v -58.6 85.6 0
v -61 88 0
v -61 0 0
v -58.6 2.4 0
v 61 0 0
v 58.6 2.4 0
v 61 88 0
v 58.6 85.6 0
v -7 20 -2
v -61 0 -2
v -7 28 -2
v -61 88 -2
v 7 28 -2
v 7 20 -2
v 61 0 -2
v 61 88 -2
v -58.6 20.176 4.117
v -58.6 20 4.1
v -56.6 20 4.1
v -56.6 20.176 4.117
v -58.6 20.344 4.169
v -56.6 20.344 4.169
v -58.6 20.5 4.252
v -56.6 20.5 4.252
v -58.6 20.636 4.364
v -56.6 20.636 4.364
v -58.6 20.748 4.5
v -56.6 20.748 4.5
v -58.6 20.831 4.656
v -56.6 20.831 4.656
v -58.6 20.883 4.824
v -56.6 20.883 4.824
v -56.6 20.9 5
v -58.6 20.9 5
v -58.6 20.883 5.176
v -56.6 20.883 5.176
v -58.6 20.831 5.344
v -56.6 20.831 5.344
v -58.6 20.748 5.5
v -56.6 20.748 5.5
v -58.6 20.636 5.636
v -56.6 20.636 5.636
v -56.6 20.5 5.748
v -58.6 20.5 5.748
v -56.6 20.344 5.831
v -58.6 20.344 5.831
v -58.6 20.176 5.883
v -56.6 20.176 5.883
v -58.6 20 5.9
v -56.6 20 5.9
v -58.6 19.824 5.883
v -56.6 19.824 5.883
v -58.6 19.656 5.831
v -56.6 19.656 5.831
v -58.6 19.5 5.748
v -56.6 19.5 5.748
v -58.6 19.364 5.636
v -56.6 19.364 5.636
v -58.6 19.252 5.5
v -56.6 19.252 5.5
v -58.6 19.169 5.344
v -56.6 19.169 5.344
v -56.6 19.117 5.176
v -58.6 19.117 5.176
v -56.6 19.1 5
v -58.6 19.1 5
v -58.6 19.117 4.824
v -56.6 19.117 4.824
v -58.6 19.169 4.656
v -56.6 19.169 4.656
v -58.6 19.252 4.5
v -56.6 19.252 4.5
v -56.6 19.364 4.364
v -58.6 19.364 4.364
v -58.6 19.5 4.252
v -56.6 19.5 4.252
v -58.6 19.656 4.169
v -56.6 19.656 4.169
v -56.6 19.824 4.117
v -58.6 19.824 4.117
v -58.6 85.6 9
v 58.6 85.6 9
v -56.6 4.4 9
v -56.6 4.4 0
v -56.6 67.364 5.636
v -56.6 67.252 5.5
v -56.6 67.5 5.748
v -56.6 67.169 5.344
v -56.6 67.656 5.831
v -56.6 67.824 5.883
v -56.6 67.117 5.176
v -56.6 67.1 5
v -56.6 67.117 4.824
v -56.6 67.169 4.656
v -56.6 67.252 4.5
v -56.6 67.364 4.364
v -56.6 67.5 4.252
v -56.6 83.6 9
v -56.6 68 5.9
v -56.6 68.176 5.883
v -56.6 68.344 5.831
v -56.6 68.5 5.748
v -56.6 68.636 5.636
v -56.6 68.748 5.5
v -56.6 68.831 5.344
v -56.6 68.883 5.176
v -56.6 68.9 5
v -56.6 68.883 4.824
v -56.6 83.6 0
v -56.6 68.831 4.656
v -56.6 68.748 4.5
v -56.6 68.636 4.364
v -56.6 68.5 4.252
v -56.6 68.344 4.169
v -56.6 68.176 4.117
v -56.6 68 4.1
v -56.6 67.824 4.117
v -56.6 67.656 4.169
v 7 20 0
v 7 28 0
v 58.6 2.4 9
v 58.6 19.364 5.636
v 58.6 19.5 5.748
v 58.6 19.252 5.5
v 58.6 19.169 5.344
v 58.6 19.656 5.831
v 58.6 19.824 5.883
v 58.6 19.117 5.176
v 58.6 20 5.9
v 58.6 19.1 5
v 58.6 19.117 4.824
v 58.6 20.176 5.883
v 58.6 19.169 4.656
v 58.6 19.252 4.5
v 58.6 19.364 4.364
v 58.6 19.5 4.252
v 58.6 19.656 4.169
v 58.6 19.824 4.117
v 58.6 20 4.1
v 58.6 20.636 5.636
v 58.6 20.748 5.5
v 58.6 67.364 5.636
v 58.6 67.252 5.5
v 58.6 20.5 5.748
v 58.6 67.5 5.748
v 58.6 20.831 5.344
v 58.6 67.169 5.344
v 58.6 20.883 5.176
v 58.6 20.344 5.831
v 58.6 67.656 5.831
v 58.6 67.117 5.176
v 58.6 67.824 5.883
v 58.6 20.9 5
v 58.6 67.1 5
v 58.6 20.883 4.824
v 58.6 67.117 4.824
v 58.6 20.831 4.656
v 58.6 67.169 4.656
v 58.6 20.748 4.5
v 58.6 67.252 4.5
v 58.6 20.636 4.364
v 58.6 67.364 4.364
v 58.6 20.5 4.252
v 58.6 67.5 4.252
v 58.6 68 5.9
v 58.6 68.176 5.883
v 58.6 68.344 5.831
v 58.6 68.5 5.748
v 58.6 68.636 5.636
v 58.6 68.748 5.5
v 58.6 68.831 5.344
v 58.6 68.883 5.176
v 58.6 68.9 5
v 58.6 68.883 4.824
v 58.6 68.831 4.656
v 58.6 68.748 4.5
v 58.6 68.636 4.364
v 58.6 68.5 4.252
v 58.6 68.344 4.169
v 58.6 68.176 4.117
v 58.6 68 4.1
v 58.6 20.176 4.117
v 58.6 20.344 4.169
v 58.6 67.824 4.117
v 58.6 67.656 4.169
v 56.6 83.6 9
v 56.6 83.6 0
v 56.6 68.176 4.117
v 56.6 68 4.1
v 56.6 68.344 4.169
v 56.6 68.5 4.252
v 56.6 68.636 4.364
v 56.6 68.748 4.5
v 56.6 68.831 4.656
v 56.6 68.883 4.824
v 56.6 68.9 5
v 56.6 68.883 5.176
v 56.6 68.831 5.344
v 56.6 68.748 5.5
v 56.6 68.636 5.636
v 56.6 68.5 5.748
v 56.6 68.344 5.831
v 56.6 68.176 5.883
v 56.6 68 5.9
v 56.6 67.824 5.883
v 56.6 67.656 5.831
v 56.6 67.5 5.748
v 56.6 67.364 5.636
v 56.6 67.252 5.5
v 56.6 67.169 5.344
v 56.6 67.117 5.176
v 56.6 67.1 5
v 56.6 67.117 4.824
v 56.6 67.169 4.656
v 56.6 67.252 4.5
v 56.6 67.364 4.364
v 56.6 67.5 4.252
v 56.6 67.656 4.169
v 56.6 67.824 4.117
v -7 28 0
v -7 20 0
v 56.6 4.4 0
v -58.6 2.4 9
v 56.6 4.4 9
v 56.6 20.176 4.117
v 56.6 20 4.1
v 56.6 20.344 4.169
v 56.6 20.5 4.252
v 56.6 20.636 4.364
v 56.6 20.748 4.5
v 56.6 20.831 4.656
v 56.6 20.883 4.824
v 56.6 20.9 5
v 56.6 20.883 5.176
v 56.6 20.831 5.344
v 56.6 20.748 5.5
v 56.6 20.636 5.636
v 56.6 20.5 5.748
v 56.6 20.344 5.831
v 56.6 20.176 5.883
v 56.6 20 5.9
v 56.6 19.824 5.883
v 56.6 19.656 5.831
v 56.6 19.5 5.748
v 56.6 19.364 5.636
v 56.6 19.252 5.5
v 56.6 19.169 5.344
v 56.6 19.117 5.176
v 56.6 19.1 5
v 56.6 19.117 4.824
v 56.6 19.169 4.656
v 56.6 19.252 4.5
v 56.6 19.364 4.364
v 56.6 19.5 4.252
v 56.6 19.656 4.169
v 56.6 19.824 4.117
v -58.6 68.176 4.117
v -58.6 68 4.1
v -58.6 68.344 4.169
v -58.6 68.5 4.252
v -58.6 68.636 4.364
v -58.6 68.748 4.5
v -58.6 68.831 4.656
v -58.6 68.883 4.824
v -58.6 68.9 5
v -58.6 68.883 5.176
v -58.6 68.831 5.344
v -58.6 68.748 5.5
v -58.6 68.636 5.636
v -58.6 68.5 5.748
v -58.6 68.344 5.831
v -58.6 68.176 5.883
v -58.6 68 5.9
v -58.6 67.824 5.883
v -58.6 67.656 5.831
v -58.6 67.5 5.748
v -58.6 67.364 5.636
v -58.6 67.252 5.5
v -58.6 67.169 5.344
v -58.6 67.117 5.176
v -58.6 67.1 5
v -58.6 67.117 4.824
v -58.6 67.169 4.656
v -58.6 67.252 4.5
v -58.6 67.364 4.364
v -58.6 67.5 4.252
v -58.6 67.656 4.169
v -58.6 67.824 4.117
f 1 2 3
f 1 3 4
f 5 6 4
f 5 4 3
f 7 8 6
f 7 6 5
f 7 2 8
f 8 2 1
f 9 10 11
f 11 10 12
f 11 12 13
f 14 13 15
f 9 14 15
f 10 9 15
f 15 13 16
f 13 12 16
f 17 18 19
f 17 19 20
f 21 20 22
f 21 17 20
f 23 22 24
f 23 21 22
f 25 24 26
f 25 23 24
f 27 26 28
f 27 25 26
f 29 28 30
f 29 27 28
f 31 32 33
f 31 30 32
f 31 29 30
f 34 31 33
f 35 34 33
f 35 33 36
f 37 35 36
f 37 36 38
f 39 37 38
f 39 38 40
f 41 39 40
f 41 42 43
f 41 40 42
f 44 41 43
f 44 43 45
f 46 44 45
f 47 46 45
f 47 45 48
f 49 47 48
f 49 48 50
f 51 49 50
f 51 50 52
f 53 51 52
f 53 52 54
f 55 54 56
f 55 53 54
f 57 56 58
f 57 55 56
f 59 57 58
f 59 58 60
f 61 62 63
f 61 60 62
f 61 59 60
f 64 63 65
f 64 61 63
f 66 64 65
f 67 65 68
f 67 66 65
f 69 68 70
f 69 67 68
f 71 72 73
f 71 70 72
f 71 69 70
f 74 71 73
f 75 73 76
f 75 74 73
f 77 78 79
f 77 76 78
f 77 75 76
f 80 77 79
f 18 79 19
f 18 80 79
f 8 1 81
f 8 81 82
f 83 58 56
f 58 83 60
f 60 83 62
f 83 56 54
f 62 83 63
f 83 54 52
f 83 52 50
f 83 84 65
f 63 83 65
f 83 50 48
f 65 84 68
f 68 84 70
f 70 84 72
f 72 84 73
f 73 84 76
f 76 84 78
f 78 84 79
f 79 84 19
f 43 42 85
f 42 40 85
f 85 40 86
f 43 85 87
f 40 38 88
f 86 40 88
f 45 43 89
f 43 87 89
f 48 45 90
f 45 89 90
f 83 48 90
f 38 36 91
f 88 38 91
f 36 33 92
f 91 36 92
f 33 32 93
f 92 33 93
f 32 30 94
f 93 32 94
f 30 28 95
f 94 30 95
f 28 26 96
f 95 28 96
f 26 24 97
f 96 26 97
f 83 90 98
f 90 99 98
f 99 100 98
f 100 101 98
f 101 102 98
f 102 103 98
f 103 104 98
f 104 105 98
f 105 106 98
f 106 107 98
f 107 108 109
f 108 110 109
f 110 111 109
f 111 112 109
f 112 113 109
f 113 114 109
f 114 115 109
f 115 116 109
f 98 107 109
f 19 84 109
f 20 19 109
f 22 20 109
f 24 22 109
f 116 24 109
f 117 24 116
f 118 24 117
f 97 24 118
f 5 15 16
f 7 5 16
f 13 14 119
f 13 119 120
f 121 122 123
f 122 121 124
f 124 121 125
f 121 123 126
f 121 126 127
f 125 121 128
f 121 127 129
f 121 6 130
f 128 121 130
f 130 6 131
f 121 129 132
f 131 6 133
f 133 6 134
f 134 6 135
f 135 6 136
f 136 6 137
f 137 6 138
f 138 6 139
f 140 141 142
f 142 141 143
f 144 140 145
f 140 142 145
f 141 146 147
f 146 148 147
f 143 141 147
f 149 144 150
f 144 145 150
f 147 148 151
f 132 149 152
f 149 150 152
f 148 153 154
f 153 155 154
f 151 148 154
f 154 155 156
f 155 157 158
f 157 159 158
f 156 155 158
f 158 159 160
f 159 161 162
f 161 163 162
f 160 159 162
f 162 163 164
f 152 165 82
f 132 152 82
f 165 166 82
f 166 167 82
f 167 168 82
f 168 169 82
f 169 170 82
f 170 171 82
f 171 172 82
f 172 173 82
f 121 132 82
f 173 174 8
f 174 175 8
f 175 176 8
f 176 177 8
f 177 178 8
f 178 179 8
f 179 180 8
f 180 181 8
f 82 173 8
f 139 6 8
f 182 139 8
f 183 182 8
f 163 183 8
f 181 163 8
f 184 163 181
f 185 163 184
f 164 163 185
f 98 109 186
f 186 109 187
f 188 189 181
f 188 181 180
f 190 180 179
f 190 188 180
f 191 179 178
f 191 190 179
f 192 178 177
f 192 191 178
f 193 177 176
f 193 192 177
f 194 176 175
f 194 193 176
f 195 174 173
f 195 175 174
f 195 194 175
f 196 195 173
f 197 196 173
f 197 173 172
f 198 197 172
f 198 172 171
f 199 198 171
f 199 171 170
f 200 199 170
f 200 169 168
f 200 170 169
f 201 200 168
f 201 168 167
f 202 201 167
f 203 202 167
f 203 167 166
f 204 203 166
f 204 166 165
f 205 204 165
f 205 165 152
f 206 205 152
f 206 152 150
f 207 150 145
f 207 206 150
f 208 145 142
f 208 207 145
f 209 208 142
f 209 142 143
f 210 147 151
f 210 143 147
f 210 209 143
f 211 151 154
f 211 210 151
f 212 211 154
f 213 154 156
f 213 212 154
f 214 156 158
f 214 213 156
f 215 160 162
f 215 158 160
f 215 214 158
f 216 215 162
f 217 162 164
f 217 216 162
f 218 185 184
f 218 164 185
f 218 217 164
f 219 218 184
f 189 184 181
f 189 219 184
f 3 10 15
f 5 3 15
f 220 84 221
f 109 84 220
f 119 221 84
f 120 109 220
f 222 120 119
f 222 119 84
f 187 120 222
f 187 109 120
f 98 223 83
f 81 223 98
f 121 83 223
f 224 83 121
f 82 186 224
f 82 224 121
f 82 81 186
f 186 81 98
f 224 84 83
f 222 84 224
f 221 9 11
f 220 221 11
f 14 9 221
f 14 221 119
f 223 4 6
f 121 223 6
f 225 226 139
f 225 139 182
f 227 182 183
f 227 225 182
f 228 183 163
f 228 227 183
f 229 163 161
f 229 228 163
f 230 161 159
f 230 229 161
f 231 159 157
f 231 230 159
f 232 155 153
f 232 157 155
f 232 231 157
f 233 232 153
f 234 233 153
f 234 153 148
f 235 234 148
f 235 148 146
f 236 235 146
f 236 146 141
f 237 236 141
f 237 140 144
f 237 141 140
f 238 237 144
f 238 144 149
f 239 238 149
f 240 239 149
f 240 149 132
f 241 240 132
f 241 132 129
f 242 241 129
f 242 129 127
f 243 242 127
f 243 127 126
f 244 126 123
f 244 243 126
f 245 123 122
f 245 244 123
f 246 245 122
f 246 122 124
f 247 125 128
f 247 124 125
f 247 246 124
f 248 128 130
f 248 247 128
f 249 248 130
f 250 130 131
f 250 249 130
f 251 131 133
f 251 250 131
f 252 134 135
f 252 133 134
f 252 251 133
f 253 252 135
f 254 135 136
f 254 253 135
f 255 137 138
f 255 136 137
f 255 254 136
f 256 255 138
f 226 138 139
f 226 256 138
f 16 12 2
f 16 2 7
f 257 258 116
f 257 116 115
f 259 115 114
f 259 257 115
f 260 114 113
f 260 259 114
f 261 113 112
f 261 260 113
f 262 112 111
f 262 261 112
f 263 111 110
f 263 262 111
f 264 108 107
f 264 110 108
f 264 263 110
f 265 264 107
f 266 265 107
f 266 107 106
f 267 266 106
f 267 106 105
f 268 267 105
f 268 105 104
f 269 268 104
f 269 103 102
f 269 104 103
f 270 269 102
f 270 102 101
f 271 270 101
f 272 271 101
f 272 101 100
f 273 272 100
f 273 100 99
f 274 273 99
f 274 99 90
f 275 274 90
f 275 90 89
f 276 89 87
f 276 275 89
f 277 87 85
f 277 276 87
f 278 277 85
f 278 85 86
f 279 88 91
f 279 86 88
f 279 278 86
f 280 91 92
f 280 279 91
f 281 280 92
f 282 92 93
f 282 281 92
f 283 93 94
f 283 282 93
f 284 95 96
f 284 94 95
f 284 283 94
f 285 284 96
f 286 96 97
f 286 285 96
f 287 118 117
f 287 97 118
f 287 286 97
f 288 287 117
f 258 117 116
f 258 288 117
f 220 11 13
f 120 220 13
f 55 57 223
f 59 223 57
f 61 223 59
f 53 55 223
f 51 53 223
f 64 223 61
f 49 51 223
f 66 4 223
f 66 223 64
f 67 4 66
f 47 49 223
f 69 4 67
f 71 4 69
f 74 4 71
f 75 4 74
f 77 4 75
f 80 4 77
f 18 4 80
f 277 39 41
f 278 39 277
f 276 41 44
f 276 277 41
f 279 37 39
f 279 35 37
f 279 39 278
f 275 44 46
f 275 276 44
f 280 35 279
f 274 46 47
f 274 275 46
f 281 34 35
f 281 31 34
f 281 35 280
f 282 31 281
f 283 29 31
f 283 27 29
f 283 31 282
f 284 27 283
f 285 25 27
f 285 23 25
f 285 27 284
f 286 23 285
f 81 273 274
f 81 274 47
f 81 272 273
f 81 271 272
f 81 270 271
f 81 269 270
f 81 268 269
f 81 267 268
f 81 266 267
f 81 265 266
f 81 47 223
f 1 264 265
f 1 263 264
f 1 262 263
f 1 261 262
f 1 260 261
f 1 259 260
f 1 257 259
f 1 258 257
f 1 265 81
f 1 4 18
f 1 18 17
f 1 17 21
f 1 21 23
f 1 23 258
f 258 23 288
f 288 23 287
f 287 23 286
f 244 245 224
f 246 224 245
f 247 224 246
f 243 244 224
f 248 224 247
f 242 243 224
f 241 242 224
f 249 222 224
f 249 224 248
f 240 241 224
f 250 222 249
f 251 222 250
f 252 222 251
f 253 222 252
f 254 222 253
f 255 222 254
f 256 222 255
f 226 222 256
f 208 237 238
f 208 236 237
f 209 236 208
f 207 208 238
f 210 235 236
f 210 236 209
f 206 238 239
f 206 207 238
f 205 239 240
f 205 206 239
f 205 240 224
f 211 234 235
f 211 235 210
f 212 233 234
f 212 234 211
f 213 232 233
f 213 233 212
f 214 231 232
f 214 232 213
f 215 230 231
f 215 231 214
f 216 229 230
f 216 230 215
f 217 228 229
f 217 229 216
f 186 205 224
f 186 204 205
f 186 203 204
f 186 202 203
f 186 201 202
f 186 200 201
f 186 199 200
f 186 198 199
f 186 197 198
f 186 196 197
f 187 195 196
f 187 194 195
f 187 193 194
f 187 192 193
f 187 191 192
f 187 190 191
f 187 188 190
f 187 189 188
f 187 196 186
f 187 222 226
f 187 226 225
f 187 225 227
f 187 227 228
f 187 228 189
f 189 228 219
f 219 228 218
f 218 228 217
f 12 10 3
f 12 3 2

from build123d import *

# Parameters (mm, degrees)
BOSS_EXTRUDE1_START = -2
SKETCH1_W           = 122
SKETCH1_H           = 88
BOSS_EXTRUDE1_DEPTH = 2
BOSS_EXTRUDE2_START = -0.5
SKETCH2_W           = 117.2
SKETCH2_H           = 83.2
BOSS_EXTRUDE2_DEPTH = 9.5
SKETCH3_W           = 113.2
SKETCH3_H           = 79.2
BOSS_EXTRUDE3_DEPTH = 10
BOSS_EXTRUDE4_START = -3
SKETCH4_W           = 14
SKETCH4_H           = 8
BOSS_EXTRUDE4_DEPTH = 4
BOSS_EXTRUDE5_START = -65
SKETCH5_R           = 0.9
BOSS_EXTRUDE5_DEPTH = 130
BOSS_EXTRUDE6_START = -65
SKETCH6_R           = 0.9
BOSS_EXTRUDE6_DEPTH = 130


with BuildPart() as part:
    # Sketch1 → Boss-Extrude1 (new body)
    with BuildSketch(Plane.XY.offset(BOSS_EXTRUDE1_START)):
        with Locations((0, 44)):
            Rectangle(SKETCH1_W, SKETCH1_H)
    extrude(amount=BOSS_EXTRUDE1_DEPTH)

    # Sketch2 → Boss-Extrude2 (add)
    with BuildSketch(Plane.XY.offset(BOSS_EXTRUDE2_START)):
        with Locations((0, 44)):
            Rectangle(SKETCH2_W, SKETCH2_H)
    extrude(amount=BOSS_EXTRUDE2_DEPTH)


with BuildPart() as body_2:
    # Sketch3 → Boss-Extrude3 (new body)
    with BuildSketch(Plane.XY):
        with Locations((0, 44)):
            Rectangle(SKETCH3_W, SKETCH3_H)
    extrude(amount=BOSS_EXTRUDE3_DEPTH)


with BuildPart() as part_1:
    add(part.part)

    # Combine1: cut body 2
    add(body_2.part, mode=Mode.SUBTRACT)


with BuildPart() as body_2_2:
    # Sketch4 → Boss-Extrude4 (new body)
    with BuildSketch(Plane.XY.offset(BOSS_EXTRUDE4_START)):
        with Locations((0, 24)):
            Rectangle(SKETCH4_W, SKETCH4_H)
    extrude(amount=BOSS_EXTRUDE4_DEPTH)


with BuildPart() as part_2:
    add(part_1.part)

    # Combine2: cut body 2 2
    add(body_2_2.part, mode=Mode.SUBTRACT)


with BuildPart() as body_2_3:
    # Sketch5 → Boss-Extrude5 (new body)
    with BuildSketch(Plane(origin=(0, 0, 0), x_dir=(0, 0, -1), z_dir=(1, 0, 0)).offset(BOSS_EXTRUDE5_START)):
        with Locations((-5, 20)):
            Circle(SKETCH5_R)
    extrude(amount=BOSS_EXTRUDE5_DEPTH)


with BuildPart() as part_3:
    add(part_2.part)

    # Combine3: cut body 2 3
    add(body_2_3.part, mode=Mode.SUBTRACT)


with BuildPart() as body_2_4:
    # Sketch6 → Boss-Extrude6 (new body)
    with BuildSketch(Plane(origin=(0, 0, 0), x_dir=(0, 0, -1), z_dir=(1, 0, 0)).offset(BOSS_EXTRUDE6_START)):
        with Locations((-5, 68)):
            Circle(SKETCH6_R)
    extrude(amount=BOSS_EXTRUDE6_DEPTH)


with BuildPart() as part_4:
    add(part_3.part)

    # Combine4: cut body 2 4
    add(body_2_4.part, mode=Mode.SUBTRACT)


solid = part_4.part
